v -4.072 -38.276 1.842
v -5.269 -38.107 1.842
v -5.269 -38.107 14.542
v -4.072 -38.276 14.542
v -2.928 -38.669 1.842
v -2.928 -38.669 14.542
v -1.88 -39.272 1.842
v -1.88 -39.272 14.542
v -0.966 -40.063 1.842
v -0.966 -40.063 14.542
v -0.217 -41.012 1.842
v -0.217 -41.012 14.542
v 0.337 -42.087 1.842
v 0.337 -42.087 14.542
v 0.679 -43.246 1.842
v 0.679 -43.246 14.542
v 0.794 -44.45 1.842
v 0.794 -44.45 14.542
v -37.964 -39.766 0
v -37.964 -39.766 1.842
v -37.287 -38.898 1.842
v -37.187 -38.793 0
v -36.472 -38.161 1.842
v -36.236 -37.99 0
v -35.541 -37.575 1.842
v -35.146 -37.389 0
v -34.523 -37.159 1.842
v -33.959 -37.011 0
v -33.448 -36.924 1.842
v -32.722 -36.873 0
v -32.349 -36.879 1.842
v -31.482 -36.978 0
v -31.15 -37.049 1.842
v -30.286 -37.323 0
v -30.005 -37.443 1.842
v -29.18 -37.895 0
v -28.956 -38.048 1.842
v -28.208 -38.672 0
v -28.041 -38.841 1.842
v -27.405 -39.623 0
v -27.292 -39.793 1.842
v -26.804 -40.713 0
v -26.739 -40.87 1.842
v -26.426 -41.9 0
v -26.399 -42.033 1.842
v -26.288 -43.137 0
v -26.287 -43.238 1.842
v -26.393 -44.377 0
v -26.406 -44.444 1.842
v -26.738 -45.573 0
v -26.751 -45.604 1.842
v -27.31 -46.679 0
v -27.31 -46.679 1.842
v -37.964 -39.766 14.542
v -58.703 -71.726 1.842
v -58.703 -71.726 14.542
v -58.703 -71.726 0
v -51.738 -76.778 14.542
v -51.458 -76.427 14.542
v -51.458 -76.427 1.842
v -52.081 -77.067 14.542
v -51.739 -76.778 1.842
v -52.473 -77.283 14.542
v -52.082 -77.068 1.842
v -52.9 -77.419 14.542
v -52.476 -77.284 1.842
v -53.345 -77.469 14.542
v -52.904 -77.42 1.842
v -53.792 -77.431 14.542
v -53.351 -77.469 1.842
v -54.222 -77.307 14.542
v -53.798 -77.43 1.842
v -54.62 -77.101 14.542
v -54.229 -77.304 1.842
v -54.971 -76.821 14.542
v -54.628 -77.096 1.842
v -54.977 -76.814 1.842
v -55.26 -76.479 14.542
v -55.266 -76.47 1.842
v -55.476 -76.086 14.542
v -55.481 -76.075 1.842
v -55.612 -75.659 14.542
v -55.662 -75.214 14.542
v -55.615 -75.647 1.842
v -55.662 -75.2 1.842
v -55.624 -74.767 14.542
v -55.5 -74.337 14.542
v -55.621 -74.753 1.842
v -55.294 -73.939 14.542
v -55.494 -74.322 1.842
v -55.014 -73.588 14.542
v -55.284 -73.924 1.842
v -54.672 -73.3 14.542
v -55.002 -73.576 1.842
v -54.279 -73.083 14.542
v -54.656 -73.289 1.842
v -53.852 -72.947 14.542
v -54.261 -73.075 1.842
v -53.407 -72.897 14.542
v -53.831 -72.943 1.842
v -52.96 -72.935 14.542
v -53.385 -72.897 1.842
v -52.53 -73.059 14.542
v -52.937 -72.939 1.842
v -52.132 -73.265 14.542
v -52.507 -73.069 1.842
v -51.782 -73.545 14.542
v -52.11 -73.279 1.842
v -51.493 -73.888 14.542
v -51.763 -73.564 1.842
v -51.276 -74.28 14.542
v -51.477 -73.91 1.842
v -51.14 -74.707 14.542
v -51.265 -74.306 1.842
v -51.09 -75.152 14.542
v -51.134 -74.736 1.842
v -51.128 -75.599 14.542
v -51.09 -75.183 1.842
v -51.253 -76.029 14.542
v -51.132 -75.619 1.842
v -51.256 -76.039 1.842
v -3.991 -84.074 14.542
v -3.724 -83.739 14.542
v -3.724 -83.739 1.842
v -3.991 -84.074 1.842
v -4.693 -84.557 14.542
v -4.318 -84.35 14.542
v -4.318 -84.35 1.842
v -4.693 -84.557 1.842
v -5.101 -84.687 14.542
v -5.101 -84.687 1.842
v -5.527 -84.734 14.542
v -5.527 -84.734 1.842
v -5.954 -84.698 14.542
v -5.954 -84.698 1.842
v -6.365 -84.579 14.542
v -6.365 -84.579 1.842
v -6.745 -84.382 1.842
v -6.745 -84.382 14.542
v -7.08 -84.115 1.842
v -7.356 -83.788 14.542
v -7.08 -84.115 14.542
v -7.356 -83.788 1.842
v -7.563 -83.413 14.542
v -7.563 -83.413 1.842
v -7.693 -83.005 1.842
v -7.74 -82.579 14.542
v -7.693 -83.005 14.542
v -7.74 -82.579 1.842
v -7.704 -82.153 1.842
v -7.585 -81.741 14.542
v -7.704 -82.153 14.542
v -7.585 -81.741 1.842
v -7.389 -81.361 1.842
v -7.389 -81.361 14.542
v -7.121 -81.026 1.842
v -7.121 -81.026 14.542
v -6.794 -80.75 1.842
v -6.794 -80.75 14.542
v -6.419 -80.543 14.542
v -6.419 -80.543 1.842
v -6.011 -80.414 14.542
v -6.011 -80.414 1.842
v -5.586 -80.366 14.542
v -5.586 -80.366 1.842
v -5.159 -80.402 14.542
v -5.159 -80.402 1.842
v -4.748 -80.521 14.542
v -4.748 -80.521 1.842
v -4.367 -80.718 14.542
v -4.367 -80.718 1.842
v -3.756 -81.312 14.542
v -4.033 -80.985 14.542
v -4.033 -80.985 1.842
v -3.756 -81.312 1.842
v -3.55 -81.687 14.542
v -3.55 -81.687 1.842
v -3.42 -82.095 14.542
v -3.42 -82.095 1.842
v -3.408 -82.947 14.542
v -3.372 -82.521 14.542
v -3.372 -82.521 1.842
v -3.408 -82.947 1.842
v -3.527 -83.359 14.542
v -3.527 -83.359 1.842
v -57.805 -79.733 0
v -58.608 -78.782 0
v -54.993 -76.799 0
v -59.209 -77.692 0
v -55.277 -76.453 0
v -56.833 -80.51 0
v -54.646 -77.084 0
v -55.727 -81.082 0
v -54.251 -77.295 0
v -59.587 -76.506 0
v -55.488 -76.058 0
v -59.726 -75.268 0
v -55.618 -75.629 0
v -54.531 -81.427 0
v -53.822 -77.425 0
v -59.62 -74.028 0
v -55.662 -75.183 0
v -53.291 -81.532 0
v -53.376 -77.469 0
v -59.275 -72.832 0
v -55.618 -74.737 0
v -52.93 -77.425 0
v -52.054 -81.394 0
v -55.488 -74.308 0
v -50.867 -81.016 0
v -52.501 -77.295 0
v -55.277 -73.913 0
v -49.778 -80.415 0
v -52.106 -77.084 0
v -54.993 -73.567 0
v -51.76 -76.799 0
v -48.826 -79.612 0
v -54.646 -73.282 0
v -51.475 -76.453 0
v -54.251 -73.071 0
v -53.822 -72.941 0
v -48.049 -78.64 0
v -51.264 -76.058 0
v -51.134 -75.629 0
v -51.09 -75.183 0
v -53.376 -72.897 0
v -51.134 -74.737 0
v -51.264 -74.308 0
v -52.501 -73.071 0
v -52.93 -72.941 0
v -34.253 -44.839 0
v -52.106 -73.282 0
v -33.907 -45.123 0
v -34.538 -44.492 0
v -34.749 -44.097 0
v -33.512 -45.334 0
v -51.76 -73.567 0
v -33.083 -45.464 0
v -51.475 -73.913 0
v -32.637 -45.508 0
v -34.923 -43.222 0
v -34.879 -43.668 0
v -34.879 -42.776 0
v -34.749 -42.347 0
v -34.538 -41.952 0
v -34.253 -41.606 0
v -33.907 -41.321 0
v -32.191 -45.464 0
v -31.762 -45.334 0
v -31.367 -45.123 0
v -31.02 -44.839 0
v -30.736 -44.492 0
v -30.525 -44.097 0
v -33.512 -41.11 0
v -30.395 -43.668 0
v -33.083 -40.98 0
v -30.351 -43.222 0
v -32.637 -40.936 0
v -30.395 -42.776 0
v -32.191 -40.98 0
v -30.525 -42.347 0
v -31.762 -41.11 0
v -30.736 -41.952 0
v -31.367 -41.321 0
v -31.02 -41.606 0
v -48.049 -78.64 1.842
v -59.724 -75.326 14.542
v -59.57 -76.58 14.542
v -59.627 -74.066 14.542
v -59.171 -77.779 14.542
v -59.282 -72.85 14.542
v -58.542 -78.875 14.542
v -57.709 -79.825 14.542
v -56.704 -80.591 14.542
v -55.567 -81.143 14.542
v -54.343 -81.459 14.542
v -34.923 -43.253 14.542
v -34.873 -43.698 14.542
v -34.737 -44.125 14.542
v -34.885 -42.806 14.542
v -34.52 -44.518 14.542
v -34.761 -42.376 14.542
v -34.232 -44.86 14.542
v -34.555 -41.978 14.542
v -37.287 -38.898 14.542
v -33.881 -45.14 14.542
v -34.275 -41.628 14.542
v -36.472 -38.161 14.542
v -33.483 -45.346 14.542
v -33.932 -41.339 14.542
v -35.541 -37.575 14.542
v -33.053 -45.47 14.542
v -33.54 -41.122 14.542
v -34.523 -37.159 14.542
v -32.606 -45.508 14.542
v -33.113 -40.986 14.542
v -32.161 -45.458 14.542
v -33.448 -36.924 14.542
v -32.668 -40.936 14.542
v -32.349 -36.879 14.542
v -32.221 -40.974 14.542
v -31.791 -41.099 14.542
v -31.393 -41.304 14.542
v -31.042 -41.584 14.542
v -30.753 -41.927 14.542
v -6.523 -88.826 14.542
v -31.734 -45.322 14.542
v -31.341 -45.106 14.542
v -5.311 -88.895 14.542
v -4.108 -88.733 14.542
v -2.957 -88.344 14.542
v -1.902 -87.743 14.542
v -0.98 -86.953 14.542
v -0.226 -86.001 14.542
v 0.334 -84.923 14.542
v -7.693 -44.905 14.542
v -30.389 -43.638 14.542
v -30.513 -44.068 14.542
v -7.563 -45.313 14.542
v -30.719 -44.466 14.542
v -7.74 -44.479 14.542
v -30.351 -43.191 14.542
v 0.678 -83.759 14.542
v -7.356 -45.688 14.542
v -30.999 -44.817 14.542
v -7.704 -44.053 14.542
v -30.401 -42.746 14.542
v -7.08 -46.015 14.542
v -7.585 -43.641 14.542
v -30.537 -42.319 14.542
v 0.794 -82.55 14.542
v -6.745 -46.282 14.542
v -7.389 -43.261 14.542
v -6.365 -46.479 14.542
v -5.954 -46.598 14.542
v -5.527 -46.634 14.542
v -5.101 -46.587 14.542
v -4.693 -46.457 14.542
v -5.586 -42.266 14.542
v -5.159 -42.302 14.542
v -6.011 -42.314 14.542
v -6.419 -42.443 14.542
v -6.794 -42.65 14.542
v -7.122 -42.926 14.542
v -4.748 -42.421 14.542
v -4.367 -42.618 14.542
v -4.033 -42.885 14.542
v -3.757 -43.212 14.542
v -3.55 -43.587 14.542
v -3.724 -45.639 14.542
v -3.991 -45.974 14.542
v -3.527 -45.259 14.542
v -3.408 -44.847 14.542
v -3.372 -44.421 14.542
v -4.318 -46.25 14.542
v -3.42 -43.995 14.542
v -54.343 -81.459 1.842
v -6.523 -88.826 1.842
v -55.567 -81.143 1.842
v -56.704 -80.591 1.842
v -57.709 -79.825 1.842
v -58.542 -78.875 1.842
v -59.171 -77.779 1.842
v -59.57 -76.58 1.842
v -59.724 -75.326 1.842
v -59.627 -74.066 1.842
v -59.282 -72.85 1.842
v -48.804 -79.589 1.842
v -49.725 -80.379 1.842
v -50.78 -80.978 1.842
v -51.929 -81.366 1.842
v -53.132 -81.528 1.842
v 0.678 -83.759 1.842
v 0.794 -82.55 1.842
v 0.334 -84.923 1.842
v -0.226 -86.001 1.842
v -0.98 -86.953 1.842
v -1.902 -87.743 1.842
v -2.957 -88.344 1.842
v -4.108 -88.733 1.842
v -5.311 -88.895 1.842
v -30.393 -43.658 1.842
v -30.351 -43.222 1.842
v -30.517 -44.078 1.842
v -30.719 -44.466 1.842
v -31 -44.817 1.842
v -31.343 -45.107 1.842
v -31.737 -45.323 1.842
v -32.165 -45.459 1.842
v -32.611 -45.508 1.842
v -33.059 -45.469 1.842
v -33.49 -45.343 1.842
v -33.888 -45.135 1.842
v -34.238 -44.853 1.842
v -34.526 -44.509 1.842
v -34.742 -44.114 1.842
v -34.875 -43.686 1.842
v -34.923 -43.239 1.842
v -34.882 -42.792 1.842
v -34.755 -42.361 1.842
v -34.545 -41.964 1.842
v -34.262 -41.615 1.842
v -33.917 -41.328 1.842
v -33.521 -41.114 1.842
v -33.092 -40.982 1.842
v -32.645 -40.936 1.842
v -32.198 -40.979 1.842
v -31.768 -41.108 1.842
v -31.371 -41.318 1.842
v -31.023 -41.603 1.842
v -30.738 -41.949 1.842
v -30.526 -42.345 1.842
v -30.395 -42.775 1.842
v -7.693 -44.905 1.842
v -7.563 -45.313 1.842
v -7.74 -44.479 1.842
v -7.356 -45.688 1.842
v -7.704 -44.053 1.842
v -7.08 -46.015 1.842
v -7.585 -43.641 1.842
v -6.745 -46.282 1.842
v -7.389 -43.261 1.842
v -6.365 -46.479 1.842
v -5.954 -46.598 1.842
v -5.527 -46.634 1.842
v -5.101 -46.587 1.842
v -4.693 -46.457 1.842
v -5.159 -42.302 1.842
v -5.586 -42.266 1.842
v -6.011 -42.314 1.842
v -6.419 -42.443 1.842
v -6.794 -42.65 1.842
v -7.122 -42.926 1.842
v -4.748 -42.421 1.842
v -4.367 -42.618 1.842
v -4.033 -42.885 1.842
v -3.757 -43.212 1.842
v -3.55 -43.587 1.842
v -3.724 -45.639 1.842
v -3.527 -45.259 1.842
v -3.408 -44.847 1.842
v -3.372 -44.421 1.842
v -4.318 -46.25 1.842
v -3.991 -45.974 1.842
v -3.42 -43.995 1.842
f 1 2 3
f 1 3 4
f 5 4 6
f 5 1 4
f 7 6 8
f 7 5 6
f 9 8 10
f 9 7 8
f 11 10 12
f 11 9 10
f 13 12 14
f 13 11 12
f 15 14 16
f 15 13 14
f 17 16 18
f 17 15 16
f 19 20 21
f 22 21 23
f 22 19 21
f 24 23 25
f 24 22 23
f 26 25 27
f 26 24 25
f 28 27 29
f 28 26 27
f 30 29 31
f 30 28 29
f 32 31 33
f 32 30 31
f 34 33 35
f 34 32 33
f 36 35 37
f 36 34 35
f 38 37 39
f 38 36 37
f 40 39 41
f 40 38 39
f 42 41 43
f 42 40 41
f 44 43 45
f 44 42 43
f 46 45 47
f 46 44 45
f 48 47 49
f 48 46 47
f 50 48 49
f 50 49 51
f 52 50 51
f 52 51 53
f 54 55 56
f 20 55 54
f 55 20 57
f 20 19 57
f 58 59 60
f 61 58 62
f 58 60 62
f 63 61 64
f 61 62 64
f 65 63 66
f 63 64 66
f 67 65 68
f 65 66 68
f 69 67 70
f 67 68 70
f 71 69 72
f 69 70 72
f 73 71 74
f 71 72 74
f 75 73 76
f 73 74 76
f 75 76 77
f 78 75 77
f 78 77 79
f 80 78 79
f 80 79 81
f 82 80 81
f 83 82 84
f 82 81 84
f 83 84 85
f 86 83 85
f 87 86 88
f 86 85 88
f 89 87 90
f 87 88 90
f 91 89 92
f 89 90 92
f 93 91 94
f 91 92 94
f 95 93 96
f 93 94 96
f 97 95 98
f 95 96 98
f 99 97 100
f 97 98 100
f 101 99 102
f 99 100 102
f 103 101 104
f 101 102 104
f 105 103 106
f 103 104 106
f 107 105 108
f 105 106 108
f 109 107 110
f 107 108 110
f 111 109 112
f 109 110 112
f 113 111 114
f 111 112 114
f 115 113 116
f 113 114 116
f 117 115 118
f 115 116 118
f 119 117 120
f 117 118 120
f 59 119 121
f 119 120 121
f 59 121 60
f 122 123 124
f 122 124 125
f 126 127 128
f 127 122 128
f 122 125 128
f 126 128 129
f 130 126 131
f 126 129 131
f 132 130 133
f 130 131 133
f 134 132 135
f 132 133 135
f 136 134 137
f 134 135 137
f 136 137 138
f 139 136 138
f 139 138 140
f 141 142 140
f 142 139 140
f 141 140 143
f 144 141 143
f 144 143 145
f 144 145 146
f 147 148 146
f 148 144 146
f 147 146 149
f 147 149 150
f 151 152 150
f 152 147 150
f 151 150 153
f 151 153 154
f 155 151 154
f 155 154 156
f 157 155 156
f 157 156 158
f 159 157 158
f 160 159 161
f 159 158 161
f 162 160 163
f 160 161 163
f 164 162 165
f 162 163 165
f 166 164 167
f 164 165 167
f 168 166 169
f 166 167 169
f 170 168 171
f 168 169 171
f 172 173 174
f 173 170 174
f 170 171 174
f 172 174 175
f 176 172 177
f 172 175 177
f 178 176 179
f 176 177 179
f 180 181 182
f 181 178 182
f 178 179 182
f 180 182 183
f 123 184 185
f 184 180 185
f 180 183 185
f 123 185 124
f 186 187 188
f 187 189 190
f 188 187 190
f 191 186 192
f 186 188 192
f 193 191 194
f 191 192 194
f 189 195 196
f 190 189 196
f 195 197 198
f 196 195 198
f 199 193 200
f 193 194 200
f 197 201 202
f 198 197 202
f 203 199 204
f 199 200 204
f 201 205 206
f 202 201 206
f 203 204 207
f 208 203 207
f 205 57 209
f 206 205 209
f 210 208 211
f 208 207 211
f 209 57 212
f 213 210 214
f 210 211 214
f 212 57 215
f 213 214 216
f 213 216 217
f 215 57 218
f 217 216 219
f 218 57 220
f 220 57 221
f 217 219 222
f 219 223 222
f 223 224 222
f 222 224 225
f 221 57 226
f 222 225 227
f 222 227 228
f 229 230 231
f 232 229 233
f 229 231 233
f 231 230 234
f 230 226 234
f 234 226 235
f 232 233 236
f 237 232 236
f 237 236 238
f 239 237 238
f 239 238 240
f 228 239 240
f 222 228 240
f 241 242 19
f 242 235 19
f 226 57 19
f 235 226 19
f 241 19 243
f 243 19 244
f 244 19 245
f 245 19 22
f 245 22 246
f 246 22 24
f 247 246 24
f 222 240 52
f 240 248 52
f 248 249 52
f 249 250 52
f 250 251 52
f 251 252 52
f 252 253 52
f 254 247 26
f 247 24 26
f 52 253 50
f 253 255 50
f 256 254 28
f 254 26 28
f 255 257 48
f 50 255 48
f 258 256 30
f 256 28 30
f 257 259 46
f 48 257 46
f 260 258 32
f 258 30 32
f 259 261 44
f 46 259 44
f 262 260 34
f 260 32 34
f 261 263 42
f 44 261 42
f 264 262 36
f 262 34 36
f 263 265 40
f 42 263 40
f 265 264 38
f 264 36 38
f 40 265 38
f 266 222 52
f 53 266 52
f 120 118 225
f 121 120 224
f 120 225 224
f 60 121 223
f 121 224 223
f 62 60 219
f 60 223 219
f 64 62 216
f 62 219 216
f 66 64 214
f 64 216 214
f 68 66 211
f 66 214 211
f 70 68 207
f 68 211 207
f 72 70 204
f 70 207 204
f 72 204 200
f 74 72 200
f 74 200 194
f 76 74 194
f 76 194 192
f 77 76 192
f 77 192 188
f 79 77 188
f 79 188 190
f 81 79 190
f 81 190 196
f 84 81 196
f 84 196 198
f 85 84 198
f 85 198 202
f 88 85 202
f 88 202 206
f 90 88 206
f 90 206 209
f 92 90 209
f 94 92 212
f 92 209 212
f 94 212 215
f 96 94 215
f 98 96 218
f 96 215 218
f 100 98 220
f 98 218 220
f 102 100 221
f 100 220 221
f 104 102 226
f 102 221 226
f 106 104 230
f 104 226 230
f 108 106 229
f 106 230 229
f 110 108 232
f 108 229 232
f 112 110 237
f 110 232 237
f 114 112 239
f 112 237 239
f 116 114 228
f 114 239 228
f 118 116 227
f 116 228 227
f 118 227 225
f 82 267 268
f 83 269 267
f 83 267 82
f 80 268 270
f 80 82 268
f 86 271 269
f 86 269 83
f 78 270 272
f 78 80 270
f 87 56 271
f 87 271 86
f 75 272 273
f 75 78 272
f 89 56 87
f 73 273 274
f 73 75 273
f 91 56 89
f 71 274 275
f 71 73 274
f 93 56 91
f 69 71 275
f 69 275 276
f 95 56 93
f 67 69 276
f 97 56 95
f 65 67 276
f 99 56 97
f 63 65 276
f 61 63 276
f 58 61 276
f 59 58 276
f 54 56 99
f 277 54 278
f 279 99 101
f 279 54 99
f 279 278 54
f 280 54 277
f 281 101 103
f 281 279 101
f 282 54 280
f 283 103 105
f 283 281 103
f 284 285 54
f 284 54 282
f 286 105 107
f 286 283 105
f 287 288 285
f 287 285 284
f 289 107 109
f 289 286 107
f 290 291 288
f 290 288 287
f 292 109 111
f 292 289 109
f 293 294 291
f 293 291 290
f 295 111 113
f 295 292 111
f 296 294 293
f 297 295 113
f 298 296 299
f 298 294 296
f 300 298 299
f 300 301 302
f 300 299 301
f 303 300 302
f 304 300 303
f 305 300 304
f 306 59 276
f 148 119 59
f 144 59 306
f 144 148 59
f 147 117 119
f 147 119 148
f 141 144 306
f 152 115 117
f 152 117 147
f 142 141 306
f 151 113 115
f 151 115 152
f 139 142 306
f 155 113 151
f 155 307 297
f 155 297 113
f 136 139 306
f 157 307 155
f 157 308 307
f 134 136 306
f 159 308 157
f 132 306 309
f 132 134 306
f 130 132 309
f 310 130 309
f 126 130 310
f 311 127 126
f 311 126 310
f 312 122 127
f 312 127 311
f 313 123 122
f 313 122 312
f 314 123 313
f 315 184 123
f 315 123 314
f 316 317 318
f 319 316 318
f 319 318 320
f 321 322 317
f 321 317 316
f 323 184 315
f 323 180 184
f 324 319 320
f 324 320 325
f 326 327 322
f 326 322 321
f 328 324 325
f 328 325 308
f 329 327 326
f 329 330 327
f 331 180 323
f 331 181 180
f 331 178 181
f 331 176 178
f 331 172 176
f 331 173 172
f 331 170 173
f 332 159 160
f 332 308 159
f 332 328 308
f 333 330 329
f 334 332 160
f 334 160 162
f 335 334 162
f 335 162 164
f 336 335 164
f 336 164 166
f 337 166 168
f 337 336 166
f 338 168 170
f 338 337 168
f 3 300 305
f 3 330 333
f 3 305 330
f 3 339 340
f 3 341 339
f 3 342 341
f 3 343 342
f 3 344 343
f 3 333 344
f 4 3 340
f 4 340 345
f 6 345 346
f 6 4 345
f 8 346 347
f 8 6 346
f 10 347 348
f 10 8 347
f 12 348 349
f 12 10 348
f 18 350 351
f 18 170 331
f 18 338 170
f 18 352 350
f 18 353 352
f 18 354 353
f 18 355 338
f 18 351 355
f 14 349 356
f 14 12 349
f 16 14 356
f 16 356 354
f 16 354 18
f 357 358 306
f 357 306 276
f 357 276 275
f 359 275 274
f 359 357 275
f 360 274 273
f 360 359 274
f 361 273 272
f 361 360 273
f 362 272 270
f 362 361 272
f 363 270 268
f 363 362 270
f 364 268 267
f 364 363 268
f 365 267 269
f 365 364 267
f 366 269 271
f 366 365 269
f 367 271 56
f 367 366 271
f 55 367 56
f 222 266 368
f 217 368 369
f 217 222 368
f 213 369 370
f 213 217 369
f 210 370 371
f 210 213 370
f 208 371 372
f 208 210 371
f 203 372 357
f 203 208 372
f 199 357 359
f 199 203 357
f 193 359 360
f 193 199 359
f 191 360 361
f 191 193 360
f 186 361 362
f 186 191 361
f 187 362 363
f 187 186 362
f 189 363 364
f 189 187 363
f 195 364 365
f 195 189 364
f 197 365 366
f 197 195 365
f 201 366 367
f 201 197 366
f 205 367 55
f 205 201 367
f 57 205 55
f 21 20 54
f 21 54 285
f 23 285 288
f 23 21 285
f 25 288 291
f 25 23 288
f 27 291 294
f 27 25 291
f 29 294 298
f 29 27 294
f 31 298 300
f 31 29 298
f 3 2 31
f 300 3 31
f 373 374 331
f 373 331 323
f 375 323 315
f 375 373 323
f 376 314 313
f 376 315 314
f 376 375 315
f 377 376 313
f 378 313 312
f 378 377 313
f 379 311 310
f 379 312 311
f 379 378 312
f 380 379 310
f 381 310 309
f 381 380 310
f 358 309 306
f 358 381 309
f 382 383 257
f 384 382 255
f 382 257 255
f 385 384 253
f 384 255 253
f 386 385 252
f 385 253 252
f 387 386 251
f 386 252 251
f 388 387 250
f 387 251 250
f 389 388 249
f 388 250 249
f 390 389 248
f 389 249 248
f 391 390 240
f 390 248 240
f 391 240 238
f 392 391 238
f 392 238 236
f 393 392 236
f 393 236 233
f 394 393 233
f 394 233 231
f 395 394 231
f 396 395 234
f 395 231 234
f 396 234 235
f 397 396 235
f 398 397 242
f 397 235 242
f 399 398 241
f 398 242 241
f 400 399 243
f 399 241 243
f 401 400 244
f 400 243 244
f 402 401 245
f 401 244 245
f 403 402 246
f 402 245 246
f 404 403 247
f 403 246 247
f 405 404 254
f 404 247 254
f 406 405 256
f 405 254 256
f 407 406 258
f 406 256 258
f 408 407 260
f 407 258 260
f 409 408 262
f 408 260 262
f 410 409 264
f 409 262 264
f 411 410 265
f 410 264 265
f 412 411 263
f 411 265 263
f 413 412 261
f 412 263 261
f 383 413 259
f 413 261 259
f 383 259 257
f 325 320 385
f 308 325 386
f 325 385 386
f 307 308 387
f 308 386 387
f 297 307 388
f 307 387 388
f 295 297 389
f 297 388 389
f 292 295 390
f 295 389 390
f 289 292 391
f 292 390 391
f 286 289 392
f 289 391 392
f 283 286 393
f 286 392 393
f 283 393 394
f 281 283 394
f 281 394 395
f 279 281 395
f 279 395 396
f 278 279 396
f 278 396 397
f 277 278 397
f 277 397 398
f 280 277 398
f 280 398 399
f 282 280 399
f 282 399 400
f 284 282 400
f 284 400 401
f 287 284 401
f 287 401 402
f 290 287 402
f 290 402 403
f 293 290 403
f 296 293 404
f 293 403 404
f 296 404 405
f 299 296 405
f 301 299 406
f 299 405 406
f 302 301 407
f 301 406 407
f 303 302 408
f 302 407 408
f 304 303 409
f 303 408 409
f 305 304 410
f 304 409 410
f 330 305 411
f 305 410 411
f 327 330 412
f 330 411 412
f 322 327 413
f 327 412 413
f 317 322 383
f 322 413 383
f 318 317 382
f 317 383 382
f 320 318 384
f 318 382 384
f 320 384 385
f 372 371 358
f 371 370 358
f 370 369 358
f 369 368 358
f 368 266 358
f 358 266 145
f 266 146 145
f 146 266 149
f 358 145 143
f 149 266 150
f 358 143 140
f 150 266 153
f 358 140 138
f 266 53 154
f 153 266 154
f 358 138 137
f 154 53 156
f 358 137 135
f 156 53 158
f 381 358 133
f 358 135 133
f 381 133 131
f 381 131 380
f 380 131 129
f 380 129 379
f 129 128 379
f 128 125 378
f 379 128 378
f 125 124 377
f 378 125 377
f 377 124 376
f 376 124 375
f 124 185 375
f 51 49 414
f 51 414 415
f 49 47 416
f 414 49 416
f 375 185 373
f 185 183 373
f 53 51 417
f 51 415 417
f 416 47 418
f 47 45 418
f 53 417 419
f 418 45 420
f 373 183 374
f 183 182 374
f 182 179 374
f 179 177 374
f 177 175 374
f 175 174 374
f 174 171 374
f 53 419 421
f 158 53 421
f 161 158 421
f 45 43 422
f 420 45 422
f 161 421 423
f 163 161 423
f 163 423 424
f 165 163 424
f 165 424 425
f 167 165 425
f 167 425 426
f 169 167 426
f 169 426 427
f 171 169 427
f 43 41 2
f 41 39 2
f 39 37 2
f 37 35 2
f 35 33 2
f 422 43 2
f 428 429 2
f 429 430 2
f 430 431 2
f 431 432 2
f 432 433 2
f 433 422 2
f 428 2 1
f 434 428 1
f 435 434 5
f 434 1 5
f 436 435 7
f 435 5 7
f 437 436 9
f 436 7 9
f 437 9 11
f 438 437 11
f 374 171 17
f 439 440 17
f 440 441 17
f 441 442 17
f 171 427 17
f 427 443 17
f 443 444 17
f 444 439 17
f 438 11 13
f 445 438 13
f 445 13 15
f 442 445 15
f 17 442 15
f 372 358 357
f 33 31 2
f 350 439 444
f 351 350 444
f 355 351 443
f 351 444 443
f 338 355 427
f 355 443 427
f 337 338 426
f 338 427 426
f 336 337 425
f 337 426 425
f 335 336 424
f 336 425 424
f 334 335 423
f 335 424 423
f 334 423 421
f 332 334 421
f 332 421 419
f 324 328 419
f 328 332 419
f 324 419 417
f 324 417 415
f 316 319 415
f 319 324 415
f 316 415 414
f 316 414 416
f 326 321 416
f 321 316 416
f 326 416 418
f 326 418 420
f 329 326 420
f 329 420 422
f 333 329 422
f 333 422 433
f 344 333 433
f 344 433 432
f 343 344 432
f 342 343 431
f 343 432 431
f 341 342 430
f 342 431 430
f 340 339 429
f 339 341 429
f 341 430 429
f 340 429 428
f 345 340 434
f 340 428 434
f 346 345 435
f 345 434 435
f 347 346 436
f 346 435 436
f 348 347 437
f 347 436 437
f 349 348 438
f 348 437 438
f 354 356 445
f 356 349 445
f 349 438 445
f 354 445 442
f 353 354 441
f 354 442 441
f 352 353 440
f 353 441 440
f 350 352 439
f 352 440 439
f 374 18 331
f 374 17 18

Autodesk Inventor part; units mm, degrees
ref_plane "YZ Plane" through (0, 0, 0) normal (1, 0, 0) x (0, 1, 0)
ref_plane "XZ Plane" through (0, 0, 0) normal (0, 1, 0) x (-1, 0, 0)
ref_plane "Work Plane1" through (0, 0, 0) normal (0, 0, 1) x (1, 0, 0)
sketch "Sketch1" plane through (0, 0, 0) normal (0, 0, 1) x (1, 0, 0)
  circle A0 centre (-53.3761, -75.183) radius 2.286 projected
  circle A1 centre (-32.6369, -43.2221) radius 2.286 projected
  line L0 (-53.3761, -75.183) -> (-32.6369, -43.2221) construction
  line L1 (-48.0493, -78.6395) -> (-27.3101, -46.6786)
  line L2 (-37.9638, -39.7656) -> (-58.7029, -71.7265)
  arc A2 (-58.7029, -71.7265) -> (-48.0493, -78.6395) centre (-53.3761, -75.183) ccw
  arc A3 (-27.3101, -46.6786) -> (-37.9638, -39.7656) centre (-32.6369, -43.2221) ccw
  line L3 (-55.5272, -90.1636) -> (-13.3531, -25.1695) projected
  point P0 (0, 0)
  point P1 (-43.0065, -59.2025)
ref_plane "Work Plane2" through (-11.9062, -368.3, 1.8415) normal (0, 0, 1) x (1, 0, 0)
extrude "Extrusion1" add sketch "Sketch1" along normal up to surface (1.8415 mm away)
sketch "Sketch2" plane through (-58.7029, -71.7265, 1.8415) normal (0, 0, 1) x (0.8388686, -0.544334, 0)
  circle A0 centre (29.7355, 51.8109) radius 2.1844 projected
  circle A1 centre (50.4747, 19.85) radius 2.1844 projected
  line L0 (0, 0) -> (0, 38.1) projected
  arc A2 (0, 0) -> (12.7, 0) centre (6.35, 0) ccw projected
  line L1 (12.7, 38.1) -> (12.7, 0) projected
  arc A3 (12.7, 38.1) -> (0, 38.1) centre (6.35, 38.1) ccw projected
  circle A4 centre (6.35, 0) radius 2.286 projected
  circle A5 centre (6.35, 38.1) radius 2.286 projected
  arc A6 (35.0623, 55.2674) -> (26.5238, 57.2888) centre (29.7355, 51.8109) ccw
  arc A7 (53.0798, 14.059) -> (55.8015, 23.3065) centre (50.4747, 19.85) ccw
  line L2 (26.5238, 57.2888) -> (3.1383, 43.5779)
  line L3 (35.0623, 55.2674) -> (55.8015, 23.3065)
  line L4 (53.0798, 14.059) -> (8.9552, -5.791)
  point P0 (10.2009, 92.1231)
  dimension "d2" = 12.7
  dimension "d3" = 12.7
extrude "Extrusion2" add sketch "Sketch2" along normal blind 12.7
properties part number "Intake"
